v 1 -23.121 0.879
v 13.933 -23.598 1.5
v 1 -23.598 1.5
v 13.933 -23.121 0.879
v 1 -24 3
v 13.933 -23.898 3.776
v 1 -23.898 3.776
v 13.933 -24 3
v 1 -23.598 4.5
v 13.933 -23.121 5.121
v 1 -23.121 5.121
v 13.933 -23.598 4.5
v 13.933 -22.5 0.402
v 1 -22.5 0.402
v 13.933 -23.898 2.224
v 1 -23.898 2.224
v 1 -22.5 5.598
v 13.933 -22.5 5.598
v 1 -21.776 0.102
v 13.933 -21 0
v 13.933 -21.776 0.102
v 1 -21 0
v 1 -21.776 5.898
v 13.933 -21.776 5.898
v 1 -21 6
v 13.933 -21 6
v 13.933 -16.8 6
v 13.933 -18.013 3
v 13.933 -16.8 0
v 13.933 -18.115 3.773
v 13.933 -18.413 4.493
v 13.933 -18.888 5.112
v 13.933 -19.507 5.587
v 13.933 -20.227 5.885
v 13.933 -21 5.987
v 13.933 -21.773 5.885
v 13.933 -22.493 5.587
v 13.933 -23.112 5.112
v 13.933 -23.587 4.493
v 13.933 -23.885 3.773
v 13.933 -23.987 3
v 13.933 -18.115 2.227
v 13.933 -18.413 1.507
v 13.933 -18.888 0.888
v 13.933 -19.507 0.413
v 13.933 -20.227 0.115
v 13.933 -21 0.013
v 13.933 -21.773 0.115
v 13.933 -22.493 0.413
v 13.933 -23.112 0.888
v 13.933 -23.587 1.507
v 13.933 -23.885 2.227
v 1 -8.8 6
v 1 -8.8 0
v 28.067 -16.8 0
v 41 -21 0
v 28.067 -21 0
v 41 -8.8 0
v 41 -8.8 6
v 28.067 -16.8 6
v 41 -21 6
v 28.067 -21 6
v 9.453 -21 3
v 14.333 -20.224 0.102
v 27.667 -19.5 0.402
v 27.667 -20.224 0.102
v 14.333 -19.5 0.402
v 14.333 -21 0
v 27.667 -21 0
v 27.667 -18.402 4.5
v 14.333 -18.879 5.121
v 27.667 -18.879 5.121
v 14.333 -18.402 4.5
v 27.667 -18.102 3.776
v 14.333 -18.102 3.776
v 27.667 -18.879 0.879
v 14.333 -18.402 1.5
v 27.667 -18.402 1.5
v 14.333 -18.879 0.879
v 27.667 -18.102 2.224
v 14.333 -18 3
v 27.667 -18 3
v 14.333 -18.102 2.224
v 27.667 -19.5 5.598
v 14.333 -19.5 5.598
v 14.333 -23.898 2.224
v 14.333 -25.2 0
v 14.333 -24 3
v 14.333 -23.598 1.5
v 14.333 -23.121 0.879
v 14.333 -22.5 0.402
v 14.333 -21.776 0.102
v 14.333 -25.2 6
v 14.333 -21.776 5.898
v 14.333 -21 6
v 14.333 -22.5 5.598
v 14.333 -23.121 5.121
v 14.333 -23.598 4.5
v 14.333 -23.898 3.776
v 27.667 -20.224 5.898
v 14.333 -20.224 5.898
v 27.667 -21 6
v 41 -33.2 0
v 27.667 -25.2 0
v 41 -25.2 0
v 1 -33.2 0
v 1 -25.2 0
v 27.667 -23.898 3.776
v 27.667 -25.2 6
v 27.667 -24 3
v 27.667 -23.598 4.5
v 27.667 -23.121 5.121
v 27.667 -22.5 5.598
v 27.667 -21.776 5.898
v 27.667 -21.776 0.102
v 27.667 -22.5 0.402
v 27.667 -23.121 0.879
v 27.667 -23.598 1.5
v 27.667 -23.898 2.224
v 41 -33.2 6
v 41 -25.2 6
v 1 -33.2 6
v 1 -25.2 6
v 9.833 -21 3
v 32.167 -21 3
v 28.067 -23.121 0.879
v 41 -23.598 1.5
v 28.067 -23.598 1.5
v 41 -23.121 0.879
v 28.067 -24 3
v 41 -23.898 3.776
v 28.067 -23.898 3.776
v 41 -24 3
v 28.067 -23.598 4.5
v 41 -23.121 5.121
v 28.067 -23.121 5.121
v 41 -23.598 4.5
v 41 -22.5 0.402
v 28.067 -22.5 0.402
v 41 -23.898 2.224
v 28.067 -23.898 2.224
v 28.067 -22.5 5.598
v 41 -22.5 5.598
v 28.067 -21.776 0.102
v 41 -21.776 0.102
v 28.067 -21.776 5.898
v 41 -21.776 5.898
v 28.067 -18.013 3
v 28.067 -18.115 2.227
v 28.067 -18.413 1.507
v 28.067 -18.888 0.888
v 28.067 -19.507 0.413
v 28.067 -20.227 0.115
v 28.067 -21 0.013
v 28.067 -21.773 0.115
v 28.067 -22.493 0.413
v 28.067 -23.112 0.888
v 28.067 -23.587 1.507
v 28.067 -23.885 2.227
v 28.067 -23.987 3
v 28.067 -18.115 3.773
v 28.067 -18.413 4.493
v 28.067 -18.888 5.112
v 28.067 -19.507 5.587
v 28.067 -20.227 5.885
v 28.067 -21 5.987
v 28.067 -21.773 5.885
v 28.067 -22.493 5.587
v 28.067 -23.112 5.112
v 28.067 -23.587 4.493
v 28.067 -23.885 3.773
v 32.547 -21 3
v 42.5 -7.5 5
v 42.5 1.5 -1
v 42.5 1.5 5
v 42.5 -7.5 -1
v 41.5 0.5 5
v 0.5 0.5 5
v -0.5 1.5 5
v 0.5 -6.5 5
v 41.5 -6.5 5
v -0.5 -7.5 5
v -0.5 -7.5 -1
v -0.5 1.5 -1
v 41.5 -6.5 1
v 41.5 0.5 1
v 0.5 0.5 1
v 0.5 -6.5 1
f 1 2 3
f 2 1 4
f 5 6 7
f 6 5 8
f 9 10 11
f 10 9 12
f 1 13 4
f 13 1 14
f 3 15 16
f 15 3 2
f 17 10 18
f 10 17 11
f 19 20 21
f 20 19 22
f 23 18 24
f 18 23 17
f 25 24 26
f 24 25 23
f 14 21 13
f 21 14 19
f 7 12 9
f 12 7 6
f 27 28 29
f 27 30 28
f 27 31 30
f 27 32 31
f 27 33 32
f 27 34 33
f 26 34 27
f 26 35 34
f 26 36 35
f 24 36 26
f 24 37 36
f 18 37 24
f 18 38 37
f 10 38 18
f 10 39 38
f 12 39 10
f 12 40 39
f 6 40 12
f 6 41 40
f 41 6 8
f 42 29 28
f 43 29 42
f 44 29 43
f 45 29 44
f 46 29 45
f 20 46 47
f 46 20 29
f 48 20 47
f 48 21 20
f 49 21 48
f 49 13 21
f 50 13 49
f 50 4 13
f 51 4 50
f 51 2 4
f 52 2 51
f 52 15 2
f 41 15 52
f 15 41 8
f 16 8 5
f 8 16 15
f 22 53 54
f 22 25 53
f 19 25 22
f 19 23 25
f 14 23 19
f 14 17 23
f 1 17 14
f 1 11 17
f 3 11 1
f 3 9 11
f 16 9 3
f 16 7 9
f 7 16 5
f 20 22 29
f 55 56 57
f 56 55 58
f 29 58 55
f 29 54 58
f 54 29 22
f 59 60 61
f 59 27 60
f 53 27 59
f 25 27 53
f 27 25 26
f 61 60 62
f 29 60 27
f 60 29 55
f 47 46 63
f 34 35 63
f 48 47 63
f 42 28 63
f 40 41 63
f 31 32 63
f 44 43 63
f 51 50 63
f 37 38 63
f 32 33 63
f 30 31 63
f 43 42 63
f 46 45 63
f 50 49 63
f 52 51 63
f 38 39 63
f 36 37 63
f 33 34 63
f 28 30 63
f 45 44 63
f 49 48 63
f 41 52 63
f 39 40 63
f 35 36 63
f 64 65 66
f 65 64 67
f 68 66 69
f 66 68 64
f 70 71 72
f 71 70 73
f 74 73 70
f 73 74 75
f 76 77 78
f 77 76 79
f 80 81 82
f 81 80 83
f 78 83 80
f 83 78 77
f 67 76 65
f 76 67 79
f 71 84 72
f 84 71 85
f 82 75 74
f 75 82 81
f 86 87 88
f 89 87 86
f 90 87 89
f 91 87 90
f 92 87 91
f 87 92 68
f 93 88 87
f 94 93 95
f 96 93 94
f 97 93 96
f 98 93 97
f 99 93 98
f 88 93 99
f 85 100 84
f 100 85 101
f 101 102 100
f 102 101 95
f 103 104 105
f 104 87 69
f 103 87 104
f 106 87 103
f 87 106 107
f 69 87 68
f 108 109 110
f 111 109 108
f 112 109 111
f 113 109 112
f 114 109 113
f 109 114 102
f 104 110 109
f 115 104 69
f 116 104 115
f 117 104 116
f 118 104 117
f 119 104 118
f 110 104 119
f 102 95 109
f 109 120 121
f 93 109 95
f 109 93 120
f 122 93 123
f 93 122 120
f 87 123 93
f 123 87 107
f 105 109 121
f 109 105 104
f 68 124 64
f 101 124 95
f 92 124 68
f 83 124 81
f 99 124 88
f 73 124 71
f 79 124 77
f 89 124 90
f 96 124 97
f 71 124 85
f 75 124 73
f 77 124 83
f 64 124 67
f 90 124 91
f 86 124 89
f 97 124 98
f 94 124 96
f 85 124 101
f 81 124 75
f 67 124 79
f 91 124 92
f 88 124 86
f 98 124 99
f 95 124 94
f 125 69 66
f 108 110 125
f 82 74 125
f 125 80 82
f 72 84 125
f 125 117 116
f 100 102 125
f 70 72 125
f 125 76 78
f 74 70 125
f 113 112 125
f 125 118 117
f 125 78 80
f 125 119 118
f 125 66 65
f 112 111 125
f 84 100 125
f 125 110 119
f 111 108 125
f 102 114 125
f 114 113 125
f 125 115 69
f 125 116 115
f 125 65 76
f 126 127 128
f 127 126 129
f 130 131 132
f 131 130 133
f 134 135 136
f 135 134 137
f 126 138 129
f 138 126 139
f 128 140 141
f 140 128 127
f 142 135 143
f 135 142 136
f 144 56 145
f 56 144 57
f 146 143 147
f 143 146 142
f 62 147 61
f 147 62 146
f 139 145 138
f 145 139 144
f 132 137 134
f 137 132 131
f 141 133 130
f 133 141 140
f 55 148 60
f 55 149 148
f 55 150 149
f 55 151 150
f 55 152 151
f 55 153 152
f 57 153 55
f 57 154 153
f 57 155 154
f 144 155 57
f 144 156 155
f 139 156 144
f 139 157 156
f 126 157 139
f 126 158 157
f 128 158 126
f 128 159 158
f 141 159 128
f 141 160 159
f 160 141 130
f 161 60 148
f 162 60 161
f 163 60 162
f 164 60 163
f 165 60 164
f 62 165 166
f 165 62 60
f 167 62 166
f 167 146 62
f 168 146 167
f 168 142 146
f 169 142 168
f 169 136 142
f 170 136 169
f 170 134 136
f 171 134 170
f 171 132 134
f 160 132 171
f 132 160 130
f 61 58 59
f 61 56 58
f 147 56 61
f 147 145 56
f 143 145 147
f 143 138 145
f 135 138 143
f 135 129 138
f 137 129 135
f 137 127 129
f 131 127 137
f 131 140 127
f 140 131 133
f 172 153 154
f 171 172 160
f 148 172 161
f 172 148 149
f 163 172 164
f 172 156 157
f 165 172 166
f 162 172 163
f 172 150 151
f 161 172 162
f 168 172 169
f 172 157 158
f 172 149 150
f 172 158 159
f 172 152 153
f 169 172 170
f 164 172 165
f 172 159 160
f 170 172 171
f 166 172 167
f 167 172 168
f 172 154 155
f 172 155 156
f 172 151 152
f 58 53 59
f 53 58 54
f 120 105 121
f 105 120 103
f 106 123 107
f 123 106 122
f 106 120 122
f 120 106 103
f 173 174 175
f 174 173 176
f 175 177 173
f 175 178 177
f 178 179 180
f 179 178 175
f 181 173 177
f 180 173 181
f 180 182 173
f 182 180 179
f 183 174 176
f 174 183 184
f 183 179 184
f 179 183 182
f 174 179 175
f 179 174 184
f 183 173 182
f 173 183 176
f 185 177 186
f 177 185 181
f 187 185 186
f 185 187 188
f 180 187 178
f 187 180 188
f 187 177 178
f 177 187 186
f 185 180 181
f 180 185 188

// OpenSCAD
// file: mathhinge.scad
module mathhinge(){
// mathgrrl cone hinge

//////////////////////////////////////////////////////
// parameters

// Length of the complete hinge
length = 20;

// Height (diameter) of the hinge
height = 3;

// Clearance between cones and holes
clearance = .2;		

// Clearance between hinge and sides
gap = .6; 				

// Parameters that the user does not get to specify
$fn=24*1;
border = 2*1; 
fudge = .01*1;			// to preserve mesh integrity
corner = 0*1;      	// space between hinge and corner
hinge_radius = height/2;
cone_height = 1.5*hinge_radius;  

//////////////////////////////////////////////////////
// renders

rotate(90,[0,1,0]) 
	translate([-hinge_radius,0,0])
		hinge();

translate([0,hinge_radius+gap,0]) bar();
translate([0,-2*border-hinge_radius-gap,0]) bar();

//translate([0,hinge_radius+gap,0]) square();
//translate([0,-length-hinge_radius-gap,0]) square();


//////////////////////////////////////////////////////
// module for hinge

module hinge(){
	rad = hinge_radius;
	clr = clearance;
	len = (length-2*corner)/3; 
	con = cone_height;
	// left outside hinge = (cylinder+box)-cone
	difference(){
		union(){
			translate([0,0,corner]) cylinder(h=len-clr,r=rad);
			translate([-rad,0,corner]) cube([2*rad,rad+gap,len-clr]);
		}
		translate([0,0,corner+len-con-clr+fudge]) cylinder(h=con,r1=0,r2=rad);
	}
	// inside hinge = cylinder+box+cone+cone
	union(){
		translate([0,0,corner+len]) cylinder(h=len,r=rad);
		translate([-rad,-rad-gap,corner+len]) cube([2*rad,rad+gap,len]);
		translate([0,0,corner+len-con]) cylinder(h=con,r1=0,r2=rad);
		translate([0,0,corner+2*len]) cylinder(h=con,r1=rad,r2=0);
	}
	// right outside hinge = (cylinder+box)-cone
	difference(){
		union(){
			translate([0,0,corner+2*len+clr]) cylinder(h=len-clr,r=rad);
			translate([-rad,0,corner+2*len+clr]) cube([2*rad,rad+gap,len-clr]);
		}
		translate([0,0,corner+2*len+clr-fudge]) cylinder(h=con,r1=rad,r2=0);	
	}
}

//////////////////////////////////////////////////////
// module for square shape

module square(){
	difference(){
		cube([length,length,height]);
		translate([border,border,-fudge])
			cube(	[length-2*border,length-2*border,height+2*fudge]);
	}
}

//////////////////////////////////////////////////////
// module for bar shape

module bar(){
	cube([length,2*border,height]);
}
}
mathhinge();
// main file
use <mathhinge.scad>;

module hinge(){
translate([1, -10, 0]) scale([2,2,2]) mathhinge();
}

module box(){
	difference(){
		cube([43, 9, 6], center=true);
		translate([0,0,2]) cube([41, 7, 6], center=true);
	}
}


translate([0, -11, 0]) hinge();
translate([21,-3,2]) box();

//for comparison
//translate([0, -5, 0]) cube([20, 4, 3]);
